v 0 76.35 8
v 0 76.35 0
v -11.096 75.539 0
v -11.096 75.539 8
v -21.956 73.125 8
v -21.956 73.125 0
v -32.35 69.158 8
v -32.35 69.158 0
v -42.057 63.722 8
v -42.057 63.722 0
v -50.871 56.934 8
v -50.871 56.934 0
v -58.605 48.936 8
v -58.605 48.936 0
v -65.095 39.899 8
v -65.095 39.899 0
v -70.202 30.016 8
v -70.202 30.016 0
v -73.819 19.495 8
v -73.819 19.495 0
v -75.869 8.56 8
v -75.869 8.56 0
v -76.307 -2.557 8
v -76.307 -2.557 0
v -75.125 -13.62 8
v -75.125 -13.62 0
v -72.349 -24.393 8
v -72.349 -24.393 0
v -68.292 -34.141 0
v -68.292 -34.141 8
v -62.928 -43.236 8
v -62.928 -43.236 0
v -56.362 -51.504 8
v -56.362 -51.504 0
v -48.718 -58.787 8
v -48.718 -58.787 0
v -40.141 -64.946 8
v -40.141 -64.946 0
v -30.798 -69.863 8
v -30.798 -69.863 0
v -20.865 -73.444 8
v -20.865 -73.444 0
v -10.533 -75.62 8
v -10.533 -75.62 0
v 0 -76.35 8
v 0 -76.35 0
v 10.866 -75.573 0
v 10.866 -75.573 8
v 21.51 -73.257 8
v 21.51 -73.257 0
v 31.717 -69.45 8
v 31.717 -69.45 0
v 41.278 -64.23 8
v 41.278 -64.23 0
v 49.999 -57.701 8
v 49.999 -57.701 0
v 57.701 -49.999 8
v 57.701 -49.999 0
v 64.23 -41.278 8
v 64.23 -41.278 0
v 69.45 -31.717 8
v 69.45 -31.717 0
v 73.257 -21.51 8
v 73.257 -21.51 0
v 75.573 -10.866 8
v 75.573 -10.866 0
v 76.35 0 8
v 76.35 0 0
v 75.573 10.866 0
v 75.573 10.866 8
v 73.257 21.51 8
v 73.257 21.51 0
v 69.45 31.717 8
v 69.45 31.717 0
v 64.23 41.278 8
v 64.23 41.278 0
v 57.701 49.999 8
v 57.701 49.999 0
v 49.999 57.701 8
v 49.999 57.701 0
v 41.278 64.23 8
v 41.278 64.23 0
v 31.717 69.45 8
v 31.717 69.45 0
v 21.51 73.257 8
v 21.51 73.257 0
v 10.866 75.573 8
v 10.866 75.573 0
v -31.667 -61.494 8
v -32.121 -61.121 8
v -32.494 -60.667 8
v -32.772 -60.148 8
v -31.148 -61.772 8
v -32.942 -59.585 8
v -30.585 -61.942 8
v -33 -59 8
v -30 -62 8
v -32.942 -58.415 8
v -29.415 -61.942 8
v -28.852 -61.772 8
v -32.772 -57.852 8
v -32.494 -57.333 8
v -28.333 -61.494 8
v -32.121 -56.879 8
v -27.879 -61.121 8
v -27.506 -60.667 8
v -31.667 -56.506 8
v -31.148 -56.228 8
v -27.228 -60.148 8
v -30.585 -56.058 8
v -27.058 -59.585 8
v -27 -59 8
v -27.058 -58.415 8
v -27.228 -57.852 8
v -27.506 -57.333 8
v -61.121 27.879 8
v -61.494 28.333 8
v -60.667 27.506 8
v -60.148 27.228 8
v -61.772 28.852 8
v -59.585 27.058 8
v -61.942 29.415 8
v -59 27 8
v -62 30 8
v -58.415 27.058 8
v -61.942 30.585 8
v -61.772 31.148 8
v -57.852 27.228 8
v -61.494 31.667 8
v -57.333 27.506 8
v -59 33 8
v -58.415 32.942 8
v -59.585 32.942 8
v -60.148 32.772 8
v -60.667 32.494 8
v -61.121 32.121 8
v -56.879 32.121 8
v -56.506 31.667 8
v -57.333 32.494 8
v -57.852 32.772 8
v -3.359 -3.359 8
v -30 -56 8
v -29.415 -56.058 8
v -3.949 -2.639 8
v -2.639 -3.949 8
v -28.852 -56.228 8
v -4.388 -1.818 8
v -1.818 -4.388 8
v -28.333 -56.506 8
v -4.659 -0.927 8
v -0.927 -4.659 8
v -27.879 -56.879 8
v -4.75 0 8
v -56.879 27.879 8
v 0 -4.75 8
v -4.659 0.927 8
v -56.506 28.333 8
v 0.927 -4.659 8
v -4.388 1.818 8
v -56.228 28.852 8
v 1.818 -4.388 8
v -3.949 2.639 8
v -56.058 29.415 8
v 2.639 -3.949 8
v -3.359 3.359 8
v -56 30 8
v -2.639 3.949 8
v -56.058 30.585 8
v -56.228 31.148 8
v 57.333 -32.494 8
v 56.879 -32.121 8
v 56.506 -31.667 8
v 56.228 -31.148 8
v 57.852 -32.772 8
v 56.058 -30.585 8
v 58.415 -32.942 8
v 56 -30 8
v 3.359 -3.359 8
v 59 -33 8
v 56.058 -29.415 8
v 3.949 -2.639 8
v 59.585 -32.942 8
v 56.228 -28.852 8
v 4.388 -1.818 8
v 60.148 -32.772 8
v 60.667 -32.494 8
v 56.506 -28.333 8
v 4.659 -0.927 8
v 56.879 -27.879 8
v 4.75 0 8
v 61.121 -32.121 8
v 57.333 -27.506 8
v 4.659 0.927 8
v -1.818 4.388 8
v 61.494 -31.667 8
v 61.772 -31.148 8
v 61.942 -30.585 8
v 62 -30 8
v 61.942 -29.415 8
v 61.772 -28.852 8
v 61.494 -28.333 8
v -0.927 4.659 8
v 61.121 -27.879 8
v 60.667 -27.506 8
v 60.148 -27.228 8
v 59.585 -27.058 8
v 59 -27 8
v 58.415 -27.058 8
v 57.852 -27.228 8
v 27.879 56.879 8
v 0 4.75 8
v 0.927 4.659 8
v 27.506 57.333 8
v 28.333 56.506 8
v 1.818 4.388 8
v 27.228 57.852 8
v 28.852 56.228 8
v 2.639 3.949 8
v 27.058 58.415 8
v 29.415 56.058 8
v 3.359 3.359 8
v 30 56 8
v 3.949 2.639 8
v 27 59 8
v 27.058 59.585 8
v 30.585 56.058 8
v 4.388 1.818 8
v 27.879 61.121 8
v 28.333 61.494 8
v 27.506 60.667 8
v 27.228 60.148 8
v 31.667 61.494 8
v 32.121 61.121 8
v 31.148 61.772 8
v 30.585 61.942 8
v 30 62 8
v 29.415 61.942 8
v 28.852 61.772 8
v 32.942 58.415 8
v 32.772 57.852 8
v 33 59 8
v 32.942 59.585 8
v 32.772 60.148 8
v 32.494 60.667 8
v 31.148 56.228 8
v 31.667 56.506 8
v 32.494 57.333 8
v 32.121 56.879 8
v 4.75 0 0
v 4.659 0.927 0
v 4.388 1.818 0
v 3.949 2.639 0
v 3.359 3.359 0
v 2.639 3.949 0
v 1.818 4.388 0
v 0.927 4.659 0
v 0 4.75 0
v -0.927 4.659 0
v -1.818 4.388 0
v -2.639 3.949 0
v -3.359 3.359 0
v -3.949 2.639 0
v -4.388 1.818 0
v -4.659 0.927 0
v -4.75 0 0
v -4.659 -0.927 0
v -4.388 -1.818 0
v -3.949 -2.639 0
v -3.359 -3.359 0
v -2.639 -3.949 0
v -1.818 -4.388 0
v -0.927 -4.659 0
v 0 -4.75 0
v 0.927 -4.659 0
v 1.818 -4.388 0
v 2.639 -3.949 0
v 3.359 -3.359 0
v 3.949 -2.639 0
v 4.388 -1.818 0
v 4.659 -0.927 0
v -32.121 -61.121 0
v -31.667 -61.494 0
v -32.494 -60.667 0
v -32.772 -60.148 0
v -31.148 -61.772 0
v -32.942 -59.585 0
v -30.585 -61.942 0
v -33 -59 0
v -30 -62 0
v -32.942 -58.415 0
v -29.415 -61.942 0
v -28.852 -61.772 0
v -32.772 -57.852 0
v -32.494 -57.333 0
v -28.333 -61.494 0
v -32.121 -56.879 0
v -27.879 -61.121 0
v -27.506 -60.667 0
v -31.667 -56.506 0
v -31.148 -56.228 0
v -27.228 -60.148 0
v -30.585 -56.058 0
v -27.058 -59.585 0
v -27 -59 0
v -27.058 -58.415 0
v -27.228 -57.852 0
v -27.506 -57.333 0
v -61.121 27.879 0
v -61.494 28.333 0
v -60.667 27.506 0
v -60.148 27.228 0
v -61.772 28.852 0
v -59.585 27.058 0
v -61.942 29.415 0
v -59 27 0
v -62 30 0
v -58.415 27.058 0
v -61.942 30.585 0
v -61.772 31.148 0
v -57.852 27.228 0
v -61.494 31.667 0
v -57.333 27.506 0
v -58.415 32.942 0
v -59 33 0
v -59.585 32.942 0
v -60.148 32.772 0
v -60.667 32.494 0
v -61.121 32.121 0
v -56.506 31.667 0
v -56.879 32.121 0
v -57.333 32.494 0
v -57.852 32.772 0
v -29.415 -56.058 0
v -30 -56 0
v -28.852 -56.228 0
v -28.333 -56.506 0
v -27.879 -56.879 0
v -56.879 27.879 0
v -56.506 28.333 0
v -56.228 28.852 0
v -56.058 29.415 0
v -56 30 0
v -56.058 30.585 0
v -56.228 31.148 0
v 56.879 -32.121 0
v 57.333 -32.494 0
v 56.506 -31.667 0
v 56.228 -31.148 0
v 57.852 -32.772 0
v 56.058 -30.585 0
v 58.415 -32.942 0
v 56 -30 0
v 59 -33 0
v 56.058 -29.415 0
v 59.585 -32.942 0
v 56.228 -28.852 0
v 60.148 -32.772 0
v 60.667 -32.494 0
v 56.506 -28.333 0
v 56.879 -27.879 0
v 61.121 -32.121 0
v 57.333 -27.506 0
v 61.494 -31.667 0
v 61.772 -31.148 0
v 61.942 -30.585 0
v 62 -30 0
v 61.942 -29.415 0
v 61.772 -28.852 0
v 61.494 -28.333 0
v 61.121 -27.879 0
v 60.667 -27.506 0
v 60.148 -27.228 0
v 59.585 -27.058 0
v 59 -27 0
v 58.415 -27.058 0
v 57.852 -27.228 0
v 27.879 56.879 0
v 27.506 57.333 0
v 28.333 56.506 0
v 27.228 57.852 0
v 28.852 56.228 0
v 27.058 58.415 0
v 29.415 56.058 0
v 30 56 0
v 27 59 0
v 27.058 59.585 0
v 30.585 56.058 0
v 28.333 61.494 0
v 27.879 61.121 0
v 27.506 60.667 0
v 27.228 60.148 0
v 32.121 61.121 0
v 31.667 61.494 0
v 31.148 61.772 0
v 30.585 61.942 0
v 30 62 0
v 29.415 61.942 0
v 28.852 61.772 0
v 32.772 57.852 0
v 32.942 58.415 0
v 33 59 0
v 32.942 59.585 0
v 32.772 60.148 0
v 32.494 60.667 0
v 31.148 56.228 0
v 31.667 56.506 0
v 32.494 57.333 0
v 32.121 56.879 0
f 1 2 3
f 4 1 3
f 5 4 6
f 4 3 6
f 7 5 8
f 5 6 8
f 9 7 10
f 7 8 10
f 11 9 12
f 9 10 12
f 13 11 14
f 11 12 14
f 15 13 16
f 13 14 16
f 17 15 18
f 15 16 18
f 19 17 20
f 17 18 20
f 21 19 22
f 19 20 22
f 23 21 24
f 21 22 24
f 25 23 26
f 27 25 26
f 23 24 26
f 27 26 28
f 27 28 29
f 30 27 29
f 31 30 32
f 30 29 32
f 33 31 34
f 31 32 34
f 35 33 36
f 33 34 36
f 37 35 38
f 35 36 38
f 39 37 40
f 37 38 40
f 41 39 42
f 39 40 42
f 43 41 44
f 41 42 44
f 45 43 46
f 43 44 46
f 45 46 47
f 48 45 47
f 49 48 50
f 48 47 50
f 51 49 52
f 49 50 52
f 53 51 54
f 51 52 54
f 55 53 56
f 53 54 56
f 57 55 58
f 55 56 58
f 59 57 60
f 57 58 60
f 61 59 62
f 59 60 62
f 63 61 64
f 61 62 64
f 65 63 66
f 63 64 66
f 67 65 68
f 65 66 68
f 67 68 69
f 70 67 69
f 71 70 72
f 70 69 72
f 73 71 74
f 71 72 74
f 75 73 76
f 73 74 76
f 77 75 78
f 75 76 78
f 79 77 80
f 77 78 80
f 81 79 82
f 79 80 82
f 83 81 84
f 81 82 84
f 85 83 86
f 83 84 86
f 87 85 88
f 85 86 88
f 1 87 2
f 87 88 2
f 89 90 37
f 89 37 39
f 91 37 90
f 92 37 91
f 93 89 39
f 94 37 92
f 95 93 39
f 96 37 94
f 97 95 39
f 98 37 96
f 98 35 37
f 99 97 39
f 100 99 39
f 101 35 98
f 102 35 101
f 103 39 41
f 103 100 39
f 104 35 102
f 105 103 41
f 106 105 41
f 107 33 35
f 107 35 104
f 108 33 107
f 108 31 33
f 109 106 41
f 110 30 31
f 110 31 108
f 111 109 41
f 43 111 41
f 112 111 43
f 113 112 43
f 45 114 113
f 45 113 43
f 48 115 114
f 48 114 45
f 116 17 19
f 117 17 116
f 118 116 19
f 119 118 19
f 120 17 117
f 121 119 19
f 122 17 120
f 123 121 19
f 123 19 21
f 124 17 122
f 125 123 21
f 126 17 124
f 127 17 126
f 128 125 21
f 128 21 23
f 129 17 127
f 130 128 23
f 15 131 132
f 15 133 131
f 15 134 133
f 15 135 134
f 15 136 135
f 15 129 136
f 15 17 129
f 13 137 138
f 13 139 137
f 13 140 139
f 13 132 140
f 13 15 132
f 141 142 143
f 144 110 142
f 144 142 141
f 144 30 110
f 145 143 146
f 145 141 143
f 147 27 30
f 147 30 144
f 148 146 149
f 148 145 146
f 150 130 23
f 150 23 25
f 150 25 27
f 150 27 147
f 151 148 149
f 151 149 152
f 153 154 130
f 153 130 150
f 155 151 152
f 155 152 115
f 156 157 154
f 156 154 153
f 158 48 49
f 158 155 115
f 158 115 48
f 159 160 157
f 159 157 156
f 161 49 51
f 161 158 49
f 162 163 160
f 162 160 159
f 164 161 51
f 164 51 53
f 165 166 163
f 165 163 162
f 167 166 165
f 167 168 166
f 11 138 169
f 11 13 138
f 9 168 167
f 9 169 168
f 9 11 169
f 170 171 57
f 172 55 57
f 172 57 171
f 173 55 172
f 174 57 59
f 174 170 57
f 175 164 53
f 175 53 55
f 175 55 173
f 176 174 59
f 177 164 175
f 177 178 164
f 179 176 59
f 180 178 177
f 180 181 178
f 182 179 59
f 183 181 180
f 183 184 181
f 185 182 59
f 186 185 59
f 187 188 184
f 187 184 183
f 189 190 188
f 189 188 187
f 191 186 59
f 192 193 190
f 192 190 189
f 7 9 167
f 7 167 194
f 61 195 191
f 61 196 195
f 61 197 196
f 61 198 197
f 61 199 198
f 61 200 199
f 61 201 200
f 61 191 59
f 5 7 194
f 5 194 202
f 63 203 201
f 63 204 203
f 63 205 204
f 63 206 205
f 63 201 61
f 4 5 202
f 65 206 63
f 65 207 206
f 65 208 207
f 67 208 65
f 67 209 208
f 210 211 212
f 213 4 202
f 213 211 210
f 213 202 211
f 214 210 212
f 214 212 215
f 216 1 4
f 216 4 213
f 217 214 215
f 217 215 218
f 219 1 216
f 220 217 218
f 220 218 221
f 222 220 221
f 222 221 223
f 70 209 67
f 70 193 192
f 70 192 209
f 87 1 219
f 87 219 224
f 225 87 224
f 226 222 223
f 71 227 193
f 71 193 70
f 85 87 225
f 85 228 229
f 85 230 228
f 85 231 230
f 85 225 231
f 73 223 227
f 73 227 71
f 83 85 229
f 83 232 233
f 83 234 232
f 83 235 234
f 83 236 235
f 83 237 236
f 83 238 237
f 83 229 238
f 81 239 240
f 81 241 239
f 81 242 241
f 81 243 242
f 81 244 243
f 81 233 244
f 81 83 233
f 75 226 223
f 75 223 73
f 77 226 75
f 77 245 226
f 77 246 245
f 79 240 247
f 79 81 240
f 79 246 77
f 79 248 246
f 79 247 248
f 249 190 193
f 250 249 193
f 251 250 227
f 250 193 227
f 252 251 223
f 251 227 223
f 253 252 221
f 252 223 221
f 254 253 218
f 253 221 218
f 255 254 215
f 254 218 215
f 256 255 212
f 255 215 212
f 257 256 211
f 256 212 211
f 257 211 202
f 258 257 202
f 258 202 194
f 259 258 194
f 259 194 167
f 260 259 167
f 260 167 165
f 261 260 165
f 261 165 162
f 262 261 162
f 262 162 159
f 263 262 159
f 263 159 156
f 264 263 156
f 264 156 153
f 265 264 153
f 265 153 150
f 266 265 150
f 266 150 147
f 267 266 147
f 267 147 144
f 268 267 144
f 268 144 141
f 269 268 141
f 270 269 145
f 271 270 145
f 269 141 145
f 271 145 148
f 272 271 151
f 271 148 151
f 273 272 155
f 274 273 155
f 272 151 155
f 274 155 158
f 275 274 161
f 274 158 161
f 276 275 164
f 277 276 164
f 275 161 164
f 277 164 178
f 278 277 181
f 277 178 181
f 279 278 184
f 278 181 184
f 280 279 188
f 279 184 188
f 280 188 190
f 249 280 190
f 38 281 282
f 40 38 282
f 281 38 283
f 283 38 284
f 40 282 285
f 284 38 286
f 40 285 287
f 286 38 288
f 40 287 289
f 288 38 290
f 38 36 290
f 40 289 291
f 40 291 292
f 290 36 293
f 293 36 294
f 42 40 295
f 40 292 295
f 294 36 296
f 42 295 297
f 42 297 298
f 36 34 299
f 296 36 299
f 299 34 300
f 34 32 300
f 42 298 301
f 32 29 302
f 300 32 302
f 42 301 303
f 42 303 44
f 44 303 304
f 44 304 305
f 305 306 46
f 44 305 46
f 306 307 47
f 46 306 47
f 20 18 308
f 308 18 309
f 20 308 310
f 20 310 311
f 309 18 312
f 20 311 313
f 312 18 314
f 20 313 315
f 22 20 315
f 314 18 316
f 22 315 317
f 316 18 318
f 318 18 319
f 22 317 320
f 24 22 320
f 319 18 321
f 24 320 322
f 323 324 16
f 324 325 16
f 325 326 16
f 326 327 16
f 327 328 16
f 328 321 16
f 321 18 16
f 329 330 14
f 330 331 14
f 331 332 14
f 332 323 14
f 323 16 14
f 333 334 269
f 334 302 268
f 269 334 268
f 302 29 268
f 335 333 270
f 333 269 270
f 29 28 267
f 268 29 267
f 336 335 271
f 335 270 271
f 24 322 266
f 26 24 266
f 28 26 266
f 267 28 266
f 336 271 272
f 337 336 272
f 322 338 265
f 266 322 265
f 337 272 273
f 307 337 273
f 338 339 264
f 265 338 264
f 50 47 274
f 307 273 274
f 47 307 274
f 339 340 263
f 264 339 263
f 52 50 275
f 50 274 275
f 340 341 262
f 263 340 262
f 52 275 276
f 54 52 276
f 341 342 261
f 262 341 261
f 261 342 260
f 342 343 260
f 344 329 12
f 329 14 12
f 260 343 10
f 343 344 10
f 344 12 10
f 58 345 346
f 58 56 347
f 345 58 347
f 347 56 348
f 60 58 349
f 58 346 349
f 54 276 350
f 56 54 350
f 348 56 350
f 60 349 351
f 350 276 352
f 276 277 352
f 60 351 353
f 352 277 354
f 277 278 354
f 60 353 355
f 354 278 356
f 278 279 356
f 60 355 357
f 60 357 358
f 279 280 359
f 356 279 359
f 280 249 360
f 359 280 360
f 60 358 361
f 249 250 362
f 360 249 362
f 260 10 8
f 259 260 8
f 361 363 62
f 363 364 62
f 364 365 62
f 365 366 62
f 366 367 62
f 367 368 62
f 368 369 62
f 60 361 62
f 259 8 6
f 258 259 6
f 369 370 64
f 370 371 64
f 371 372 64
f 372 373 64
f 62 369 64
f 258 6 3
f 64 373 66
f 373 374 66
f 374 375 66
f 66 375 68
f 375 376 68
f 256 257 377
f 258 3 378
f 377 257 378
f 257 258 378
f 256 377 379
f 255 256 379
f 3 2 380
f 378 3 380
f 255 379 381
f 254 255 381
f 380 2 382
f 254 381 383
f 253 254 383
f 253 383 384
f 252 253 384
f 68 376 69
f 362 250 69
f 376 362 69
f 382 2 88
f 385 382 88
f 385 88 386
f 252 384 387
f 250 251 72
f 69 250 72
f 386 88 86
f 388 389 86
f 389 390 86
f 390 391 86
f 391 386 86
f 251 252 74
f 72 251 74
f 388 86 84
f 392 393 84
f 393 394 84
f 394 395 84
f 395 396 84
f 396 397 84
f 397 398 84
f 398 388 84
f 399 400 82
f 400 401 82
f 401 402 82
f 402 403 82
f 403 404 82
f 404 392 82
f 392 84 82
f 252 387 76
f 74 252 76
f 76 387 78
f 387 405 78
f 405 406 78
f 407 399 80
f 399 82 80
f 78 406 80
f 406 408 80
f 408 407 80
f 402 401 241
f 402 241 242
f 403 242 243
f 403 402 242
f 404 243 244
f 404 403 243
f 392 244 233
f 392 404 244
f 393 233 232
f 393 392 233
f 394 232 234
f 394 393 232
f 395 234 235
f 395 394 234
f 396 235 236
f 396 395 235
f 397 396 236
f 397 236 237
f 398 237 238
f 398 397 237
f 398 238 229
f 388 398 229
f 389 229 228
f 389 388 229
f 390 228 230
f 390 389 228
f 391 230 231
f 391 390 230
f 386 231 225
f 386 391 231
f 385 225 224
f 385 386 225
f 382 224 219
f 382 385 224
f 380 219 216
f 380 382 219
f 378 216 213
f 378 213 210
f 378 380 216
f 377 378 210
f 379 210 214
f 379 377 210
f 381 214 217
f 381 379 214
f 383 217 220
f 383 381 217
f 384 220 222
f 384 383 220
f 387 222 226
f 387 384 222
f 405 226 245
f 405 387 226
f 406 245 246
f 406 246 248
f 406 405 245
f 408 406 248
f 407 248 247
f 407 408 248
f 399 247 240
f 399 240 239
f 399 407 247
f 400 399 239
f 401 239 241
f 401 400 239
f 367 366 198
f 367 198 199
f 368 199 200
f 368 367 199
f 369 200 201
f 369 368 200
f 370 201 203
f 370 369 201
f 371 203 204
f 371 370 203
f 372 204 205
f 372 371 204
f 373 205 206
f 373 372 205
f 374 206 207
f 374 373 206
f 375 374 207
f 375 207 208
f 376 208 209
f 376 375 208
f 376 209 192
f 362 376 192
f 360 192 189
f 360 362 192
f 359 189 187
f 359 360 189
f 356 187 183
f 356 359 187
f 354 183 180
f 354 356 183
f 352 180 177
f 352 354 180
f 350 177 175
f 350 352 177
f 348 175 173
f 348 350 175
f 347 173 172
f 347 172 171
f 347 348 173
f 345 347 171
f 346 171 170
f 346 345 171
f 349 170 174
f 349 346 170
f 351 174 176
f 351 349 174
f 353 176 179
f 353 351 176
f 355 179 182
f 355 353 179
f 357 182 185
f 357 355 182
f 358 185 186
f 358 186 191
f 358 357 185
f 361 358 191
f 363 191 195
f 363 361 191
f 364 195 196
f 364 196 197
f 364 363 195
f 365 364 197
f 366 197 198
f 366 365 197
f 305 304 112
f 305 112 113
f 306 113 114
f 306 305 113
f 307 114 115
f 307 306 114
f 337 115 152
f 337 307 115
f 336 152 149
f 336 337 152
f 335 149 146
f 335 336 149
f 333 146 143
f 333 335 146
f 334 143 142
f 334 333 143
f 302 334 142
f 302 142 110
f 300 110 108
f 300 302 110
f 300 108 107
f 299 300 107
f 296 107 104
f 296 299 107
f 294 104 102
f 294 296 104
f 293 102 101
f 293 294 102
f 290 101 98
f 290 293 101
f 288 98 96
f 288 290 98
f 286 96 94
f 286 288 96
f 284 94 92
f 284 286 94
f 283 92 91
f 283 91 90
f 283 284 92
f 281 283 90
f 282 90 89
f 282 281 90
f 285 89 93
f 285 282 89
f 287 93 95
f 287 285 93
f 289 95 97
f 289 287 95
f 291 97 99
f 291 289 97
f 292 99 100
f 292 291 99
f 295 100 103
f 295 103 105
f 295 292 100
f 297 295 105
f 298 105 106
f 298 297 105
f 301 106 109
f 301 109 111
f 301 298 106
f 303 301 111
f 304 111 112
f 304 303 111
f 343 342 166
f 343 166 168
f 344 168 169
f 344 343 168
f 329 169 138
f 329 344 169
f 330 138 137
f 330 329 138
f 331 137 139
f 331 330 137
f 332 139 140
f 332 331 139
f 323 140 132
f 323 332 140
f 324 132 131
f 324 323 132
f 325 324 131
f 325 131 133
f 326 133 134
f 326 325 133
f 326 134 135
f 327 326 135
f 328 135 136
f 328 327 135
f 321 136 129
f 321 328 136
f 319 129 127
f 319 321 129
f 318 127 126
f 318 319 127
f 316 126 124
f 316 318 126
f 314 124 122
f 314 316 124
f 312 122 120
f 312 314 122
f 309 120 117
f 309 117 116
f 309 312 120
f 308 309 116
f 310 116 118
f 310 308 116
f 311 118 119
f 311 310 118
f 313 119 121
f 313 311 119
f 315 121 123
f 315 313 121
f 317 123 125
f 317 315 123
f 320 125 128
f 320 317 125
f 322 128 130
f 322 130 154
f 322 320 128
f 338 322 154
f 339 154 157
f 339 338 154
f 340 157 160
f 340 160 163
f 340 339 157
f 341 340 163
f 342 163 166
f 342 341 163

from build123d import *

# Parameters (mm, degrees)
SKETCH1_R           = 3
BOSS_EXTRUDE3_DEPTH = 8
SKETCH2_R           = 4.75
CUT_EXTRUDE1_DEPTH  = 109.271164213


with BuildPart() as part:
    # Sketch1 → Boss-Extrude3 (new body)
    # profile 1 of 5: a face of its own
    with BuildSketch(Plane.XY):
        with BuildLine():
            ThreePointArc((76.35, 0), (53.987602744, 53.987602744), (0, 76.35))
            ThreePointArc((0, 76.35), (-62.014972319, 44.536116897), (-72.348554199, -24.392810524))
            ThreePointArc((-72.348554199, -24.392810524), (-44.536116897, -62.014972319), (0, -76.35))
            ThreePointArc((0, -76.35), (53.987602744, -53.987602744), (76.35, 0))
        make_face()
        Polygon((-27.25, -54.236860279), (-24.5, -59), (-27.25, -63.763139721), (-32.75, -63.763139721), (-35.5, -59), (-32.75, -54.236860279), align=None, mode=Mode.SUBTRACT)
        Polygon((54.236860279, -27.25), (59, -24.5), (63.763139721, -27.25), (63.763139721, -32.75), (59, -35.5), (54.236860279, -32.75), align=None, mode=Mode.SUBTRACT)
        Polygon((-54.236860279, 27.25), (-59, 24.5), (-63.763139721, 27.25), (-63.763139721, 32.75), (-59, 35.5), (-54.236860279, 32.75), align=None, mode=Mode.SUBTRACT)
        Polygon((27.25, 54.236860279), (24.5, 59), (27.25, 63.763139721), (32.75, 63.763139721), (35.5, 59), (32.75, 54.236860279), align=None, mode=Mode.SUBTRACT)
    # profile 2 of 5: a face of its own
    with BuildSketch(Plane.XY):
        Polygon((-63.763139721, 32.75), (-63.763139721, 27.25), (-59, 24.5), (-54.236860279, 27.25), (-54.236860279, 32.75), (-59, 35.5), align=None)
        with Locations((-59, 30)):
            Circle(SKETCH1_R, mode=Mode.SUBTRACT)
    # profile 3 of 5: a face of its own
    with BuildSketch(Plane.XY):
        Polygon((32.75, 63.763139721), (27.25, 63.763139721), (24.5, 59), (27.25, 54.236860279), (32.75, 54.236860279), (35.5, 59), align=None)
        with Locations((30, 59)):
            Circle(SKETCH1_R, mode=Mode.SUBTRACT)
    # profile 4 of 5: a face of its own
    with BuildSketch(Plane.XY):
        Polygon((63.763139721, -32.75), (63.763139721, -27.25), (59, -24.5), (54.236860279, -27.25), (54.236860279, -32.75), (59, -35.5), align=None)
        with Locations((59, -30)):
            Circle(SKETCH1_R, mode=Mode.SUBTRACT)
    # profile 5 of 5: a face of its own
    with BuildSketch(Plane.XY):
        Polygon((-32.75, -63.763139721), (-27.25, -63.763139721), (-24.5, -59), (-27.25, -54.236860279), (-32.75, -54.236860279), (-35.5, -59), align=None)
        with Locations((-30, -59)):
            Circle(SKETCH1_R, mode=Mode.SUBTRACT)
    extrude(amount=BOSS_EXTRUDE3_DEPTH)

    # Sketch2 → Cut-Extrude1 (cut, through all)
    with BuildSketch(Plane.XY.offset(8)):
        Circle(SKETCH2_R)
    extrude(amount=-CUT_EXTRUDE1_DEPTH, mode=Mode.SUBTRACT)


solid = part.part
